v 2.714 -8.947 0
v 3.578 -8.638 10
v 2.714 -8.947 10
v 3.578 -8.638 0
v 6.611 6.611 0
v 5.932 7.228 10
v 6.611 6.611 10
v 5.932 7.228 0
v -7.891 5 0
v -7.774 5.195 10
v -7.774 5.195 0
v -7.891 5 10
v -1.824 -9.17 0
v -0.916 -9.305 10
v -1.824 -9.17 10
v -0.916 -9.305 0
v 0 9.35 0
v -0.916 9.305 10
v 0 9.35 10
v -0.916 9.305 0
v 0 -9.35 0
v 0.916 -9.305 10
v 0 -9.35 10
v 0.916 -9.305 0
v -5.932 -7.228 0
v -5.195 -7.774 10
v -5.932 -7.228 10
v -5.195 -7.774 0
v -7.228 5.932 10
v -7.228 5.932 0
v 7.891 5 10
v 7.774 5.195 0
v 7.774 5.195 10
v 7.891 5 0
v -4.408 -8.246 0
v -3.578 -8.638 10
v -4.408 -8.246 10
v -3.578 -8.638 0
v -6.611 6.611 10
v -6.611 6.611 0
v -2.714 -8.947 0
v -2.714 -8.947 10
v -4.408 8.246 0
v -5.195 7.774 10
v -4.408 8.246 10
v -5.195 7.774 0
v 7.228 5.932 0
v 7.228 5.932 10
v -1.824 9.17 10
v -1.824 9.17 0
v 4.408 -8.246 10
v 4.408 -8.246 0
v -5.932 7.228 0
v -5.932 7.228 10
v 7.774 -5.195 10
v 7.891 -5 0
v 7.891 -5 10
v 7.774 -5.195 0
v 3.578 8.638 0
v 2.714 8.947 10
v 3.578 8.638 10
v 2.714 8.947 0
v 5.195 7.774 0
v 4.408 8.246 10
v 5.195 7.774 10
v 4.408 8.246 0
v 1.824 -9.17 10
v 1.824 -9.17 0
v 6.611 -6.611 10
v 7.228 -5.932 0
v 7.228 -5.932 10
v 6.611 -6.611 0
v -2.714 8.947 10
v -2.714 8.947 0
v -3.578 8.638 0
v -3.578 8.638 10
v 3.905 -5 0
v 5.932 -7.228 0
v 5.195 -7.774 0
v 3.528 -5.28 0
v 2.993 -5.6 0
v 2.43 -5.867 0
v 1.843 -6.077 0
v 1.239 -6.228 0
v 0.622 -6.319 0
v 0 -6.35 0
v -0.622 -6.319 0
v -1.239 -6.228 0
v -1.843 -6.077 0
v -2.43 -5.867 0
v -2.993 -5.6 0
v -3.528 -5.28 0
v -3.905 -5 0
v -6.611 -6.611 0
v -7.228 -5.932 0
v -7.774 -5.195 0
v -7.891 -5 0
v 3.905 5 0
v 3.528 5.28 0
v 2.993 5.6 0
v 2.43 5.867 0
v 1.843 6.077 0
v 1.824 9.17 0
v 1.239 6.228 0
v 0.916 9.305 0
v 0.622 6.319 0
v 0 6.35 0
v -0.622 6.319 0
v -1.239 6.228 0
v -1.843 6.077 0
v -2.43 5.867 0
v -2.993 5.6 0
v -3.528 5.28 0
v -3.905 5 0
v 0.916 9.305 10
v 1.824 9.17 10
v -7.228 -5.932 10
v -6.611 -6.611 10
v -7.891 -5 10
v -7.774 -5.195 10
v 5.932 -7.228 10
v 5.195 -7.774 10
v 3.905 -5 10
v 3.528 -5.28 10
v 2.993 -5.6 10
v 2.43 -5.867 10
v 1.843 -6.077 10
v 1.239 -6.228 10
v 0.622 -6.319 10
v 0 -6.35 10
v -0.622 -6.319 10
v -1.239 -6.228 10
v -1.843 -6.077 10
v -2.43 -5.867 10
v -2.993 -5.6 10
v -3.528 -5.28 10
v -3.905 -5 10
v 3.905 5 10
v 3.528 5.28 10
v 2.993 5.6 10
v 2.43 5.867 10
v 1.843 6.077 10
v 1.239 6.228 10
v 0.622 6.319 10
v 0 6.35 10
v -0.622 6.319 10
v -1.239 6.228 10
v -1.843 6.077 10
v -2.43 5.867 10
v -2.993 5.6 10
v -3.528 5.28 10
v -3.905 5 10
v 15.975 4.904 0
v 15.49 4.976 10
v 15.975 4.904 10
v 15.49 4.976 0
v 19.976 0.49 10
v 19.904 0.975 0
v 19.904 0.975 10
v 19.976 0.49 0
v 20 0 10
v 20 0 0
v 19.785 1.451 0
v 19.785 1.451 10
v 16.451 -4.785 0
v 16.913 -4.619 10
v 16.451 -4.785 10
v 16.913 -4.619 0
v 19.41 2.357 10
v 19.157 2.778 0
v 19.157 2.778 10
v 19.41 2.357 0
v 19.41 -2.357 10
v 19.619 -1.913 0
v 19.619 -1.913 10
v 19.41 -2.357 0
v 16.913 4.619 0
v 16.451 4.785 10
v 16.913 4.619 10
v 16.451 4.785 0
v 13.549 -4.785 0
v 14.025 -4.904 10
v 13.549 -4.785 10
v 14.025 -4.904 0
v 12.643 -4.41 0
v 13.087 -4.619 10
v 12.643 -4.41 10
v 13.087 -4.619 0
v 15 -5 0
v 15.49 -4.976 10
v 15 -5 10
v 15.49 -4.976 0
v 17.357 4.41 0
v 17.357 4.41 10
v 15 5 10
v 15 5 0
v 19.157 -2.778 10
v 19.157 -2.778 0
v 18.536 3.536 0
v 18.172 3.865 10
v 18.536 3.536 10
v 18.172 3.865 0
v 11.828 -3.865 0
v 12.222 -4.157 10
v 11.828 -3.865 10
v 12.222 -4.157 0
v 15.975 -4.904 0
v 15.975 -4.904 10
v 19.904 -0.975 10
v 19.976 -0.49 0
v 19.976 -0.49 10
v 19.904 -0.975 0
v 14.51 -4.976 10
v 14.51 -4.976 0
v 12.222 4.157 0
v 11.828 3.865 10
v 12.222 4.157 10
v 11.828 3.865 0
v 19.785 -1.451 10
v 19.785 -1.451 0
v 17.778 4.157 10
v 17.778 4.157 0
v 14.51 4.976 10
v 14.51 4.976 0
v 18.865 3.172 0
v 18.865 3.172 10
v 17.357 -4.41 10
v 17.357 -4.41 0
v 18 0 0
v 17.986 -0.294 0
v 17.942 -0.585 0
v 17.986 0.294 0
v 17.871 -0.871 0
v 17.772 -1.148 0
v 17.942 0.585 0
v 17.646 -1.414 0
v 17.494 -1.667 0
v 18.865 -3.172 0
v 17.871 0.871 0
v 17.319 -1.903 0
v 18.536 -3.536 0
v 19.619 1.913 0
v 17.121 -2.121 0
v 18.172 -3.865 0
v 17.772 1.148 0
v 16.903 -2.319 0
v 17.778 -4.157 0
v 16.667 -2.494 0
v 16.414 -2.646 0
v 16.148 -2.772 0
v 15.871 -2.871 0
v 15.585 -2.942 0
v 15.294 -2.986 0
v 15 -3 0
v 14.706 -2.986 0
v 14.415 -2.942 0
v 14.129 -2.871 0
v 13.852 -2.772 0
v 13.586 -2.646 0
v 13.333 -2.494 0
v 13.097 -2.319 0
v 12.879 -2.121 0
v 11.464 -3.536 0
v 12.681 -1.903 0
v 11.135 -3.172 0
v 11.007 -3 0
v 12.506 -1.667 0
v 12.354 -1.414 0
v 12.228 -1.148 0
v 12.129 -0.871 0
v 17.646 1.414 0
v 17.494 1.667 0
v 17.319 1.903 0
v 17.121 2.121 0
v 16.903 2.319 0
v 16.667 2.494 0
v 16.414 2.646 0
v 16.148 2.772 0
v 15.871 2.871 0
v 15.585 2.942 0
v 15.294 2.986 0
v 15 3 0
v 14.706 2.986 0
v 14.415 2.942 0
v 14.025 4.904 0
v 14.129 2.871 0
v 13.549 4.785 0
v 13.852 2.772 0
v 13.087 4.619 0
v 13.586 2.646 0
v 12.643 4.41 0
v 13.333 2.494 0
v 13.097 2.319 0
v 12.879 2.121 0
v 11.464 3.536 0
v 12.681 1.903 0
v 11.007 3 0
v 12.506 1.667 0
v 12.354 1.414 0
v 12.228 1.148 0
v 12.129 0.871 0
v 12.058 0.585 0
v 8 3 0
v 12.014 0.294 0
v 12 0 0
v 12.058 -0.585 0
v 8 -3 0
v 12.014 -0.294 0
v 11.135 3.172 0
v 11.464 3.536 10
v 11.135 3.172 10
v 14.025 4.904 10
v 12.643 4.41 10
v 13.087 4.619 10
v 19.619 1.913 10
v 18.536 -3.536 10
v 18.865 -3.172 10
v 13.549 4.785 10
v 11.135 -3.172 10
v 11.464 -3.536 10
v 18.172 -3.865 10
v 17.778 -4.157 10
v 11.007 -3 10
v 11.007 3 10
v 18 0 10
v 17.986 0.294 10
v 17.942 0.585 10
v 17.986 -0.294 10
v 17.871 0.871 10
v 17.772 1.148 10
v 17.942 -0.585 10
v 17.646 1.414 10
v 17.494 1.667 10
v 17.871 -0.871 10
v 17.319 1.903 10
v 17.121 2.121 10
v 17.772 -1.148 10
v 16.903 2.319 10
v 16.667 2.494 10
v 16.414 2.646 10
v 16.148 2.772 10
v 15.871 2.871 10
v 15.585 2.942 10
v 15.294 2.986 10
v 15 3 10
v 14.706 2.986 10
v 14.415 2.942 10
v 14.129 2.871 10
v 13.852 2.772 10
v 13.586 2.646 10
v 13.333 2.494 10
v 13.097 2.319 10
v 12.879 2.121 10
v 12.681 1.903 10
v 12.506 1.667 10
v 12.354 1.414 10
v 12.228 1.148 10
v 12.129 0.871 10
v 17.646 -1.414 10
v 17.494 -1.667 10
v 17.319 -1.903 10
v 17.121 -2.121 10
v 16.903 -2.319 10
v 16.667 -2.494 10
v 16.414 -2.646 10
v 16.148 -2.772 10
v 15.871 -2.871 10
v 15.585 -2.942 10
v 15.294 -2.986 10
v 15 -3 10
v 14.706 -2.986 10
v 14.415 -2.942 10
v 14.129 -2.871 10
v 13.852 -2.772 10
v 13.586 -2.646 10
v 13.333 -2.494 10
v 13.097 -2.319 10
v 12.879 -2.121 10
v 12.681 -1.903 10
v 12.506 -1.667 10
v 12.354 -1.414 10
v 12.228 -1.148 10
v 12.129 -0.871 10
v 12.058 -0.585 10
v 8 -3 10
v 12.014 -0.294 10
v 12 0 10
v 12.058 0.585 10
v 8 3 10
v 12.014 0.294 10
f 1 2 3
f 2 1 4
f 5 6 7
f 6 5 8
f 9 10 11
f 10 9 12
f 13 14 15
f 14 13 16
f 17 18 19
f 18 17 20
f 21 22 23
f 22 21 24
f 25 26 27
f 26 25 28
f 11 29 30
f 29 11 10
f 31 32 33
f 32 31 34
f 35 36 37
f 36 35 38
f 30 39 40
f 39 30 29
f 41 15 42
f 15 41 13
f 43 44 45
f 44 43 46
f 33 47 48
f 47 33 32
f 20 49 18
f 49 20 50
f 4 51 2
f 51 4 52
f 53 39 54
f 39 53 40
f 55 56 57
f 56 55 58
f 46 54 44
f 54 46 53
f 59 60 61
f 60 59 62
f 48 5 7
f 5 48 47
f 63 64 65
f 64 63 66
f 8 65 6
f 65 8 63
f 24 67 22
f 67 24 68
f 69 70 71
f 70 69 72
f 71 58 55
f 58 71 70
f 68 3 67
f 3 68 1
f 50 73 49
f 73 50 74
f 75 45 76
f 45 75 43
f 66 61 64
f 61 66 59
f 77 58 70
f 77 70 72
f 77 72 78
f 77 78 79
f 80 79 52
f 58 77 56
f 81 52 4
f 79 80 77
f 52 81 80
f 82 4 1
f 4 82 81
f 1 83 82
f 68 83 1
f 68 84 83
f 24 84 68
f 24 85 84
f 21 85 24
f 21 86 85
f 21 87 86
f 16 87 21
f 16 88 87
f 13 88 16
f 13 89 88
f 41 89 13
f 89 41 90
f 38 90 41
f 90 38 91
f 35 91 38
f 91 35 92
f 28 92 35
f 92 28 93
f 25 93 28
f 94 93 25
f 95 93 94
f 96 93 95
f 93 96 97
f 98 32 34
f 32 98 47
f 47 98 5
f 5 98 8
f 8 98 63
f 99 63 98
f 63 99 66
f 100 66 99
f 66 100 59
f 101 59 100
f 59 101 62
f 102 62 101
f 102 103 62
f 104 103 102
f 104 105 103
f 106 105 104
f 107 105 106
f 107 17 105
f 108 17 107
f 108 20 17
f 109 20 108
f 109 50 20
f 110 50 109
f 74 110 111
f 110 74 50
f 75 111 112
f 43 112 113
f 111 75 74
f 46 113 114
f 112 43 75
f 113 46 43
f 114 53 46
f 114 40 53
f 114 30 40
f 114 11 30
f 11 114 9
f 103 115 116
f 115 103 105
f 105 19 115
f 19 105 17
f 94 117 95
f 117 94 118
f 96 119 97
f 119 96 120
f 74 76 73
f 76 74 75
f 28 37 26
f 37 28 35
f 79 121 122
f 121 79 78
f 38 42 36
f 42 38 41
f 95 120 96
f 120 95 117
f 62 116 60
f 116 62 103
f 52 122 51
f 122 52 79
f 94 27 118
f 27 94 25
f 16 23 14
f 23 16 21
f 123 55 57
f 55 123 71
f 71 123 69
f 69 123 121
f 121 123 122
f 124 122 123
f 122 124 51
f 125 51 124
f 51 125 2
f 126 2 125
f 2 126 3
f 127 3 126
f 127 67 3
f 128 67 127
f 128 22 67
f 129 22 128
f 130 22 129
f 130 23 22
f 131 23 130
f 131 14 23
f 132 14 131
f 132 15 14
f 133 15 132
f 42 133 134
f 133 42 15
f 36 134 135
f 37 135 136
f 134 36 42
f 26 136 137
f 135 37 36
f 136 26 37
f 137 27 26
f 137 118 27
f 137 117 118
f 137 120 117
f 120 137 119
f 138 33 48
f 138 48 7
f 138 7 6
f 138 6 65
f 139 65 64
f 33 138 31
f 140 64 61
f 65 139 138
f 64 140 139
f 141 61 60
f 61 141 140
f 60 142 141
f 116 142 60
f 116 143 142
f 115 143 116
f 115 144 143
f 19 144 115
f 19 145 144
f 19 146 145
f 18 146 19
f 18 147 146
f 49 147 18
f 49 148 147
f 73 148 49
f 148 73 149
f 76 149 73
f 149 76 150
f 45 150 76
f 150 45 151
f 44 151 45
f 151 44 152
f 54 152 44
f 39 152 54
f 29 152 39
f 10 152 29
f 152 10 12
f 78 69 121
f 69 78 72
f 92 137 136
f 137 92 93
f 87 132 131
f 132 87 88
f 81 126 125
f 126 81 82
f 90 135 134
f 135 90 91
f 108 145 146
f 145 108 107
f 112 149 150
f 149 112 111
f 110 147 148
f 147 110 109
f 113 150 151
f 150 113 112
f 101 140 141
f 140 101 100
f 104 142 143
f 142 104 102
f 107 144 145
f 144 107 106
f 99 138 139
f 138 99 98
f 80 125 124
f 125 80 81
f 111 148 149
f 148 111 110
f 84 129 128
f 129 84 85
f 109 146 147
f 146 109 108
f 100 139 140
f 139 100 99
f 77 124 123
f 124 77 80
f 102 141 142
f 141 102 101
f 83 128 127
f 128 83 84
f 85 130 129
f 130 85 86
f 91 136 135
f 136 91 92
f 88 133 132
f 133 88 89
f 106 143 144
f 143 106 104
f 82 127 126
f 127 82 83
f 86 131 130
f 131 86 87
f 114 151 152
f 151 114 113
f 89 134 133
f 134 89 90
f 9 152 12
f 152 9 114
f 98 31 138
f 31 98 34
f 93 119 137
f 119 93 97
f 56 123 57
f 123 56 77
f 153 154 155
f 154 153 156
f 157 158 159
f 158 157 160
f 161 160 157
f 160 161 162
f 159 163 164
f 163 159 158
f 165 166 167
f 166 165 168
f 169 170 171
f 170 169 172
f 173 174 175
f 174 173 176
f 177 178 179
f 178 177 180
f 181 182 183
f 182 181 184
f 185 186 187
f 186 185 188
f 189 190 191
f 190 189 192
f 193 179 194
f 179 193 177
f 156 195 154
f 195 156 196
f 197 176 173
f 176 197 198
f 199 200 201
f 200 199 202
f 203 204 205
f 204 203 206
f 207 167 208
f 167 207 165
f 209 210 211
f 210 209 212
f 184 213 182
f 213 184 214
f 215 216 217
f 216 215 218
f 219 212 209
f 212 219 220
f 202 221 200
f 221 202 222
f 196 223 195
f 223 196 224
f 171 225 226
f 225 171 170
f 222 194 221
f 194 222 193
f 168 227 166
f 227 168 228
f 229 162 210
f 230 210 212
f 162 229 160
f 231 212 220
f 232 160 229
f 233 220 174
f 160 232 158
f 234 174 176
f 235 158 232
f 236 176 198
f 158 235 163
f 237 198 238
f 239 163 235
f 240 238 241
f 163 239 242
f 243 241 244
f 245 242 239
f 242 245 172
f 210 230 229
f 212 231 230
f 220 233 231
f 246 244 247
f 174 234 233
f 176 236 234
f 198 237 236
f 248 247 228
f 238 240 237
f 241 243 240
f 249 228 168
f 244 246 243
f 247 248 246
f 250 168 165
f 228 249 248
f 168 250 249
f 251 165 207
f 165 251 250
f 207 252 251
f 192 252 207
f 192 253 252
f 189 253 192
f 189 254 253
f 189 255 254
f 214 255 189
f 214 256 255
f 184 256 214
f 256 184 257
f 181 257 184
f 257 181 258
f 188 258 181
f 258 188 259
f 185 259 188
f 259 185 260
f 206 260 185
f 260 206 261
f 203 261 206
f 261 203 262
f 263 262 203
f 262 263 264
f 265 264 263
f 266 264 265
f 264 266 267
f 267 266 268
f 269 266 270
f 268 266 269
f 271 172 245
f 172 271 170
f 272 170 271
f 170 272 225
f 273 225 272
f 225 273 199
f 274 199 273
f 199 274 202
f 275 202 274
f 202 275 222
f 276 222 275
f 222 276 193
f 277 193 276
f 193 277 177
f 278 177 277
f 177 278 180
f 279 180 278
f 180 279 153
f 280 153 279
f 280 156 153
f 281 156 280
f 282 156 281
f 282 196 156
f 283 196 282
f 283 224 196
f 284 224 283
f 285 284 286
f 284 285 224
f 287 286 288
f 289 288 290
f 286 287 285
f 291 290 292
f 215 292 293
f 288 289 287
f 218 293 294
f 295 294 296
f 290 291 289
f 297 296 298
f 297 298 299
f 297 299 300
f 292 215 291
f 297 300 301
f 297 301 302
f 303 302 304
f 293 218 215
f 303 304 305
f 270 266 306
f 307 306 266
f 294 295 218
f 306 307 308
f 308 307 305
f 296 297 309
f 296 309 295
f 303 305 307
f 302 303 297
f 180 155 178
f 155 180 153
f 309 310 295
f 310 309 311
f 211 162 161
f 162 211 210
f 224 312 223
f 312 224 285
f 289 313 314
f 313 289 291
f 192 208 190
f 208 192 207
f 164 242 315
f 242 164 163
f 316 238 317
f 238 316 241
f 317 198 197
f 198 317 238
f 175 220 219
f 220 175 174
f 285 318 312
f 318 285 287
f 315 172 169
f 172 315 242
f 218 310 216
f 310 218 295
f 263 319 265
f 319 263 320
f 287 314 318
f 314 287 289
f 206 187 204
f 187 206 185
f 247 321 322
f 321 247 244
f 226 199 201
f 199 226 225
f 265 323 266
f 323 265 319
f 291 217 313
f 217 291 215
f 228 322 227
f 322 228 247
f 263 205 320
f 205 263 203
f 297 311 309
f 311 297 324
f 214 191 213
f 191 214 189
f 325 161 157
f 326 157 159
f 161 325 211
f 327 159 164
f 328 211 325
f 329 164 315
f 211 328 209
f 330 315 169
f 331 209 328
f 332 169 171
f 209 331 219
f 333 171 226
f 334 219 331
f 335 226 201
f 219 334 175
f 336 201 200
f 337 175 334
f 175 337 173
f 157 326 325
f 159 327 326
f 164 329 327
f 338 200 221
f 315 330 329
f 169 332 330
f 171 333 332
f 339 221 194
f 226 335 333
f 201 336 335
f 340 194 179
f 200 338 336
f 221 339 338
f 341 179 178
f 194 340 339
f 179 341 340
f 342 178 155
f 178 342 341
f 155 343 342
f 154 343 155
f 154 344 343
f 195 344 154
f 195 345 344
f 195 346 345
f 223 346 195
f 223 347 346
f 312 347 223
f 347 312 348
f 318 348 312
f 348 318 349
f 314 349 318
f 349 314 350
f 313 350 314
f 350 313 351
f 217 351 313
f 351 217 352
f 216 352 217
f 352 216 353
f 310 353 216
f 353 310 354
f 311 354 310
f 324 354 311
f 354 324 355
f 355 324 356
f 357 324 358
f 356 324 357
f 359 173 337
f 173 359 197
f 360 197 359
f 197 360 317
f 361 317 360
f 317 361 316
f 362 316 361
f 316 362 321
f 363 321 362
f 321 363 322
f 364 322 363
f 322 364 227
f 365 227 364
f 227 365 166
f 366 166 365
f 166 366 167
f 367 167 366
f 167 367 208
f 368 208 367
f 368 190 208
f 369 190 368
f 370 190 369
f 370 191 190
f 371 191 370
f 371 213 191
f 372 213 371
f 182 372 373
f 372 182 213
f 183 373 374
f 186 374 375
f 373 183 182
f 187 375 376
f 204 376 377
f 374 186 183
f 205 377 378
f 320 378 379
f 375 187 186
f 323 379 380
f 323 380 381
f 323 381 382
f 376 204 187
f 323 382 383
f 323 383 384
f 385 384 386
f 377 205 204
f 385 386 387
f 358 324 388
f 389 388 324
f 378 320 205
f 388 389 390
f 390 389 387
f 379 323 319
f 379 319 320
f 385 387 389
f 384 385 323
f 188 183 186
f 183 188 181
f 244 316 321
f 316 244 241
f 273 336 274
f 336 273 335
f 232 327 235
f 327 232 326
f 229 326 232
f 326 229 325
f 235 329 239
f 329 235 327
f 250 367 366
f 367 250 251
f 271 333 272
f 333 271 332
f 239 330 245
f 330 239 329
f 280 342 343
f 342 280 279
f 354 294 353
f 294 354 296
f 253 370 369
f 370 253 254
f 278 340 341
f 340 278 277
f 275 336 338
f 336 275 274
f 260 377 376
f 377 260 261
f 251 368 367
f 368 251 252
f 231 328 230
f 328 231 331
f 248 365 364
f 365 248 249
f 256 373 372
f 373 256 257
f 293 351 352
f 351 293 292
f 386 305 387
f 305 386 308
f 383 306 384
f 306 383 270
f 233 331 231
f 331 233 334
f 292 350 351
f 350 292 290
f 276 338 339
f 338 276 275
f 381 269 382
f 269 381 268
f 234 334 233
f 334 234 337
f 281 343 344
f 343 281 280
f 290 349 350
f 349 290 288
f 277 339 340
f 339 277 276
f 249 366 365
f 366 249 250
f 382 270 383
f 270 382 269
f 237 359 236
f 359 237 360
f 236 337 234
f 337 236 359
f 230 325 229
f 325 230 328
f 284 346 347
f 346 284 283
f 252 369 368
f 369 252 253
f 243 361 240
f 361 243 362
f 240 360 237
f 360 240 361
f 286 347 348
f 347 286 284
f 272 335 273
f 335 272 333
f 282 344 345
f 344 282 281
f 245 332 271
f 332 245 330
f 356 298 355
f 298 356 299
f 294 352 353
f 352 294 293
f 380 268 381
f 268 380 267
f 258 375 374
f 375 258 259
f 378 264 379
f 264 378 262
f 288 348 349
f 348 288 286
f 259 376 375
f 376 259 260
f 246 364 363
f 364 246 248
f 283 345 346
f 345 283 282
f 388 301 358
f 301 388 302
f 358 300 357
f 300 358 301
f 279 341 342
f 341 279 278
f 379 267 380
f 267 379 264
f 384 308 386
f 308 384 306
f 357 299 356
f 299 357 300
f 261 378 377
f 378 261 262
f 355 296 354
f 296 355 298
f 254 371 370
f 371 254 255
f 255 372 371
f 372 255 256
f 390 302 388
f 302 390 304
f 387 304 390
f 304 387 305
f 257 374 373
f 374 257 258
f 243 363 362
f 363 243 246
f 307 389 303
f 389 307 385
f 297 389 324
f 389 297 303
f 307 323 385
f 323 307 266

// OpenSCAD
// ---------------------------
// Parameters (mm)
// ---------------------------
rod_inner_d   = 12.7;          // inner diameter of the stand‑rod ring
rod_wall      = 3;            // wall thickness of the stand‑rod ring
rod_outer_d   = rod_inner_d + 2*rod_wall; // outer diameter of the stand‑rod ring
rod_open_w    = 10;           // width of the opening on the -X side of the rod ring

tube_inner_d  = 6;            // inner diameter of the tubing ring
tube_wall     = 2;            // wall thickness of the tubing ring
tube_outer_d  = tube_inner_d + 2*tube_wall; // outer diameter of the tubing ring
tube_center_x = 15;          // X‑position of the tubing ring centre
tube_open_w   = 4.5;          // width of the opening on the +X side of the tubing ring

part_h        = 10;           // total height (extrusion Z)

bridge_x_start = 8;           // left X of the solid bridge
bridge_x_end   = 12;          // right X of the solid bridge
bridge_y_w    = 6;            // Y width of the bridge

// Rendering quality for circles/cylinders
$fn = 64;

// ---------------------------
// Modules
// ---------------------------

// Stand‑rod ring with its snap‑on opening
module rod_ring() {
    difference() {
        // Outer cylinder (solid)
        cylinder(d = rod_outer_d, h = part_h);
        // Inner hole (extends 0.2 mm beyond top/bottom)
        cylinder(d = rod_inner_d, h = part_h + 0.2);
        // Opening cut on the -X side
        translate([-rod_outer_d/2 - 0.1, -rod_open_w/2, -0.1])
            cube([rod_outer_d + 0.2, rod_open_w, part_h + 0.2]);
    }
}

// Tubing ring with its snap‑on opening
module tubing_ring() {
    translate([tube_center_x, 0, 0])  // centre the ring at (tube_center_x,0)
    difference() {
        // Outer cylinder
        cylinder(d = tube_outer_d, h = part_h);
        // Inner hole (extends 0.2 mm beyond top/bottom)
        cylinder(d = tube_inner_d, h = part_h + 0.2);
        // Opening cut on the +X side
        translate([tube_outer_d/2 + 0.1, -tube_open_w/2, -0.1])
            cube([tube_outer_d + 0.2, tube_open_w, part_h + 0.2]);
    }
}

// Solid bridge joining the two rings
module bridge() {
    translate([bridge_x_start, -bridge_y_w/2, 0])
        cube([bridge_x_end - bridge_x_start, bridge_y_w, part_h]);
}

// ---------------------------
// Assembly
// ---------------------------
union() {
    rod_ring();
    tubing_ring();
    bridge();
}
